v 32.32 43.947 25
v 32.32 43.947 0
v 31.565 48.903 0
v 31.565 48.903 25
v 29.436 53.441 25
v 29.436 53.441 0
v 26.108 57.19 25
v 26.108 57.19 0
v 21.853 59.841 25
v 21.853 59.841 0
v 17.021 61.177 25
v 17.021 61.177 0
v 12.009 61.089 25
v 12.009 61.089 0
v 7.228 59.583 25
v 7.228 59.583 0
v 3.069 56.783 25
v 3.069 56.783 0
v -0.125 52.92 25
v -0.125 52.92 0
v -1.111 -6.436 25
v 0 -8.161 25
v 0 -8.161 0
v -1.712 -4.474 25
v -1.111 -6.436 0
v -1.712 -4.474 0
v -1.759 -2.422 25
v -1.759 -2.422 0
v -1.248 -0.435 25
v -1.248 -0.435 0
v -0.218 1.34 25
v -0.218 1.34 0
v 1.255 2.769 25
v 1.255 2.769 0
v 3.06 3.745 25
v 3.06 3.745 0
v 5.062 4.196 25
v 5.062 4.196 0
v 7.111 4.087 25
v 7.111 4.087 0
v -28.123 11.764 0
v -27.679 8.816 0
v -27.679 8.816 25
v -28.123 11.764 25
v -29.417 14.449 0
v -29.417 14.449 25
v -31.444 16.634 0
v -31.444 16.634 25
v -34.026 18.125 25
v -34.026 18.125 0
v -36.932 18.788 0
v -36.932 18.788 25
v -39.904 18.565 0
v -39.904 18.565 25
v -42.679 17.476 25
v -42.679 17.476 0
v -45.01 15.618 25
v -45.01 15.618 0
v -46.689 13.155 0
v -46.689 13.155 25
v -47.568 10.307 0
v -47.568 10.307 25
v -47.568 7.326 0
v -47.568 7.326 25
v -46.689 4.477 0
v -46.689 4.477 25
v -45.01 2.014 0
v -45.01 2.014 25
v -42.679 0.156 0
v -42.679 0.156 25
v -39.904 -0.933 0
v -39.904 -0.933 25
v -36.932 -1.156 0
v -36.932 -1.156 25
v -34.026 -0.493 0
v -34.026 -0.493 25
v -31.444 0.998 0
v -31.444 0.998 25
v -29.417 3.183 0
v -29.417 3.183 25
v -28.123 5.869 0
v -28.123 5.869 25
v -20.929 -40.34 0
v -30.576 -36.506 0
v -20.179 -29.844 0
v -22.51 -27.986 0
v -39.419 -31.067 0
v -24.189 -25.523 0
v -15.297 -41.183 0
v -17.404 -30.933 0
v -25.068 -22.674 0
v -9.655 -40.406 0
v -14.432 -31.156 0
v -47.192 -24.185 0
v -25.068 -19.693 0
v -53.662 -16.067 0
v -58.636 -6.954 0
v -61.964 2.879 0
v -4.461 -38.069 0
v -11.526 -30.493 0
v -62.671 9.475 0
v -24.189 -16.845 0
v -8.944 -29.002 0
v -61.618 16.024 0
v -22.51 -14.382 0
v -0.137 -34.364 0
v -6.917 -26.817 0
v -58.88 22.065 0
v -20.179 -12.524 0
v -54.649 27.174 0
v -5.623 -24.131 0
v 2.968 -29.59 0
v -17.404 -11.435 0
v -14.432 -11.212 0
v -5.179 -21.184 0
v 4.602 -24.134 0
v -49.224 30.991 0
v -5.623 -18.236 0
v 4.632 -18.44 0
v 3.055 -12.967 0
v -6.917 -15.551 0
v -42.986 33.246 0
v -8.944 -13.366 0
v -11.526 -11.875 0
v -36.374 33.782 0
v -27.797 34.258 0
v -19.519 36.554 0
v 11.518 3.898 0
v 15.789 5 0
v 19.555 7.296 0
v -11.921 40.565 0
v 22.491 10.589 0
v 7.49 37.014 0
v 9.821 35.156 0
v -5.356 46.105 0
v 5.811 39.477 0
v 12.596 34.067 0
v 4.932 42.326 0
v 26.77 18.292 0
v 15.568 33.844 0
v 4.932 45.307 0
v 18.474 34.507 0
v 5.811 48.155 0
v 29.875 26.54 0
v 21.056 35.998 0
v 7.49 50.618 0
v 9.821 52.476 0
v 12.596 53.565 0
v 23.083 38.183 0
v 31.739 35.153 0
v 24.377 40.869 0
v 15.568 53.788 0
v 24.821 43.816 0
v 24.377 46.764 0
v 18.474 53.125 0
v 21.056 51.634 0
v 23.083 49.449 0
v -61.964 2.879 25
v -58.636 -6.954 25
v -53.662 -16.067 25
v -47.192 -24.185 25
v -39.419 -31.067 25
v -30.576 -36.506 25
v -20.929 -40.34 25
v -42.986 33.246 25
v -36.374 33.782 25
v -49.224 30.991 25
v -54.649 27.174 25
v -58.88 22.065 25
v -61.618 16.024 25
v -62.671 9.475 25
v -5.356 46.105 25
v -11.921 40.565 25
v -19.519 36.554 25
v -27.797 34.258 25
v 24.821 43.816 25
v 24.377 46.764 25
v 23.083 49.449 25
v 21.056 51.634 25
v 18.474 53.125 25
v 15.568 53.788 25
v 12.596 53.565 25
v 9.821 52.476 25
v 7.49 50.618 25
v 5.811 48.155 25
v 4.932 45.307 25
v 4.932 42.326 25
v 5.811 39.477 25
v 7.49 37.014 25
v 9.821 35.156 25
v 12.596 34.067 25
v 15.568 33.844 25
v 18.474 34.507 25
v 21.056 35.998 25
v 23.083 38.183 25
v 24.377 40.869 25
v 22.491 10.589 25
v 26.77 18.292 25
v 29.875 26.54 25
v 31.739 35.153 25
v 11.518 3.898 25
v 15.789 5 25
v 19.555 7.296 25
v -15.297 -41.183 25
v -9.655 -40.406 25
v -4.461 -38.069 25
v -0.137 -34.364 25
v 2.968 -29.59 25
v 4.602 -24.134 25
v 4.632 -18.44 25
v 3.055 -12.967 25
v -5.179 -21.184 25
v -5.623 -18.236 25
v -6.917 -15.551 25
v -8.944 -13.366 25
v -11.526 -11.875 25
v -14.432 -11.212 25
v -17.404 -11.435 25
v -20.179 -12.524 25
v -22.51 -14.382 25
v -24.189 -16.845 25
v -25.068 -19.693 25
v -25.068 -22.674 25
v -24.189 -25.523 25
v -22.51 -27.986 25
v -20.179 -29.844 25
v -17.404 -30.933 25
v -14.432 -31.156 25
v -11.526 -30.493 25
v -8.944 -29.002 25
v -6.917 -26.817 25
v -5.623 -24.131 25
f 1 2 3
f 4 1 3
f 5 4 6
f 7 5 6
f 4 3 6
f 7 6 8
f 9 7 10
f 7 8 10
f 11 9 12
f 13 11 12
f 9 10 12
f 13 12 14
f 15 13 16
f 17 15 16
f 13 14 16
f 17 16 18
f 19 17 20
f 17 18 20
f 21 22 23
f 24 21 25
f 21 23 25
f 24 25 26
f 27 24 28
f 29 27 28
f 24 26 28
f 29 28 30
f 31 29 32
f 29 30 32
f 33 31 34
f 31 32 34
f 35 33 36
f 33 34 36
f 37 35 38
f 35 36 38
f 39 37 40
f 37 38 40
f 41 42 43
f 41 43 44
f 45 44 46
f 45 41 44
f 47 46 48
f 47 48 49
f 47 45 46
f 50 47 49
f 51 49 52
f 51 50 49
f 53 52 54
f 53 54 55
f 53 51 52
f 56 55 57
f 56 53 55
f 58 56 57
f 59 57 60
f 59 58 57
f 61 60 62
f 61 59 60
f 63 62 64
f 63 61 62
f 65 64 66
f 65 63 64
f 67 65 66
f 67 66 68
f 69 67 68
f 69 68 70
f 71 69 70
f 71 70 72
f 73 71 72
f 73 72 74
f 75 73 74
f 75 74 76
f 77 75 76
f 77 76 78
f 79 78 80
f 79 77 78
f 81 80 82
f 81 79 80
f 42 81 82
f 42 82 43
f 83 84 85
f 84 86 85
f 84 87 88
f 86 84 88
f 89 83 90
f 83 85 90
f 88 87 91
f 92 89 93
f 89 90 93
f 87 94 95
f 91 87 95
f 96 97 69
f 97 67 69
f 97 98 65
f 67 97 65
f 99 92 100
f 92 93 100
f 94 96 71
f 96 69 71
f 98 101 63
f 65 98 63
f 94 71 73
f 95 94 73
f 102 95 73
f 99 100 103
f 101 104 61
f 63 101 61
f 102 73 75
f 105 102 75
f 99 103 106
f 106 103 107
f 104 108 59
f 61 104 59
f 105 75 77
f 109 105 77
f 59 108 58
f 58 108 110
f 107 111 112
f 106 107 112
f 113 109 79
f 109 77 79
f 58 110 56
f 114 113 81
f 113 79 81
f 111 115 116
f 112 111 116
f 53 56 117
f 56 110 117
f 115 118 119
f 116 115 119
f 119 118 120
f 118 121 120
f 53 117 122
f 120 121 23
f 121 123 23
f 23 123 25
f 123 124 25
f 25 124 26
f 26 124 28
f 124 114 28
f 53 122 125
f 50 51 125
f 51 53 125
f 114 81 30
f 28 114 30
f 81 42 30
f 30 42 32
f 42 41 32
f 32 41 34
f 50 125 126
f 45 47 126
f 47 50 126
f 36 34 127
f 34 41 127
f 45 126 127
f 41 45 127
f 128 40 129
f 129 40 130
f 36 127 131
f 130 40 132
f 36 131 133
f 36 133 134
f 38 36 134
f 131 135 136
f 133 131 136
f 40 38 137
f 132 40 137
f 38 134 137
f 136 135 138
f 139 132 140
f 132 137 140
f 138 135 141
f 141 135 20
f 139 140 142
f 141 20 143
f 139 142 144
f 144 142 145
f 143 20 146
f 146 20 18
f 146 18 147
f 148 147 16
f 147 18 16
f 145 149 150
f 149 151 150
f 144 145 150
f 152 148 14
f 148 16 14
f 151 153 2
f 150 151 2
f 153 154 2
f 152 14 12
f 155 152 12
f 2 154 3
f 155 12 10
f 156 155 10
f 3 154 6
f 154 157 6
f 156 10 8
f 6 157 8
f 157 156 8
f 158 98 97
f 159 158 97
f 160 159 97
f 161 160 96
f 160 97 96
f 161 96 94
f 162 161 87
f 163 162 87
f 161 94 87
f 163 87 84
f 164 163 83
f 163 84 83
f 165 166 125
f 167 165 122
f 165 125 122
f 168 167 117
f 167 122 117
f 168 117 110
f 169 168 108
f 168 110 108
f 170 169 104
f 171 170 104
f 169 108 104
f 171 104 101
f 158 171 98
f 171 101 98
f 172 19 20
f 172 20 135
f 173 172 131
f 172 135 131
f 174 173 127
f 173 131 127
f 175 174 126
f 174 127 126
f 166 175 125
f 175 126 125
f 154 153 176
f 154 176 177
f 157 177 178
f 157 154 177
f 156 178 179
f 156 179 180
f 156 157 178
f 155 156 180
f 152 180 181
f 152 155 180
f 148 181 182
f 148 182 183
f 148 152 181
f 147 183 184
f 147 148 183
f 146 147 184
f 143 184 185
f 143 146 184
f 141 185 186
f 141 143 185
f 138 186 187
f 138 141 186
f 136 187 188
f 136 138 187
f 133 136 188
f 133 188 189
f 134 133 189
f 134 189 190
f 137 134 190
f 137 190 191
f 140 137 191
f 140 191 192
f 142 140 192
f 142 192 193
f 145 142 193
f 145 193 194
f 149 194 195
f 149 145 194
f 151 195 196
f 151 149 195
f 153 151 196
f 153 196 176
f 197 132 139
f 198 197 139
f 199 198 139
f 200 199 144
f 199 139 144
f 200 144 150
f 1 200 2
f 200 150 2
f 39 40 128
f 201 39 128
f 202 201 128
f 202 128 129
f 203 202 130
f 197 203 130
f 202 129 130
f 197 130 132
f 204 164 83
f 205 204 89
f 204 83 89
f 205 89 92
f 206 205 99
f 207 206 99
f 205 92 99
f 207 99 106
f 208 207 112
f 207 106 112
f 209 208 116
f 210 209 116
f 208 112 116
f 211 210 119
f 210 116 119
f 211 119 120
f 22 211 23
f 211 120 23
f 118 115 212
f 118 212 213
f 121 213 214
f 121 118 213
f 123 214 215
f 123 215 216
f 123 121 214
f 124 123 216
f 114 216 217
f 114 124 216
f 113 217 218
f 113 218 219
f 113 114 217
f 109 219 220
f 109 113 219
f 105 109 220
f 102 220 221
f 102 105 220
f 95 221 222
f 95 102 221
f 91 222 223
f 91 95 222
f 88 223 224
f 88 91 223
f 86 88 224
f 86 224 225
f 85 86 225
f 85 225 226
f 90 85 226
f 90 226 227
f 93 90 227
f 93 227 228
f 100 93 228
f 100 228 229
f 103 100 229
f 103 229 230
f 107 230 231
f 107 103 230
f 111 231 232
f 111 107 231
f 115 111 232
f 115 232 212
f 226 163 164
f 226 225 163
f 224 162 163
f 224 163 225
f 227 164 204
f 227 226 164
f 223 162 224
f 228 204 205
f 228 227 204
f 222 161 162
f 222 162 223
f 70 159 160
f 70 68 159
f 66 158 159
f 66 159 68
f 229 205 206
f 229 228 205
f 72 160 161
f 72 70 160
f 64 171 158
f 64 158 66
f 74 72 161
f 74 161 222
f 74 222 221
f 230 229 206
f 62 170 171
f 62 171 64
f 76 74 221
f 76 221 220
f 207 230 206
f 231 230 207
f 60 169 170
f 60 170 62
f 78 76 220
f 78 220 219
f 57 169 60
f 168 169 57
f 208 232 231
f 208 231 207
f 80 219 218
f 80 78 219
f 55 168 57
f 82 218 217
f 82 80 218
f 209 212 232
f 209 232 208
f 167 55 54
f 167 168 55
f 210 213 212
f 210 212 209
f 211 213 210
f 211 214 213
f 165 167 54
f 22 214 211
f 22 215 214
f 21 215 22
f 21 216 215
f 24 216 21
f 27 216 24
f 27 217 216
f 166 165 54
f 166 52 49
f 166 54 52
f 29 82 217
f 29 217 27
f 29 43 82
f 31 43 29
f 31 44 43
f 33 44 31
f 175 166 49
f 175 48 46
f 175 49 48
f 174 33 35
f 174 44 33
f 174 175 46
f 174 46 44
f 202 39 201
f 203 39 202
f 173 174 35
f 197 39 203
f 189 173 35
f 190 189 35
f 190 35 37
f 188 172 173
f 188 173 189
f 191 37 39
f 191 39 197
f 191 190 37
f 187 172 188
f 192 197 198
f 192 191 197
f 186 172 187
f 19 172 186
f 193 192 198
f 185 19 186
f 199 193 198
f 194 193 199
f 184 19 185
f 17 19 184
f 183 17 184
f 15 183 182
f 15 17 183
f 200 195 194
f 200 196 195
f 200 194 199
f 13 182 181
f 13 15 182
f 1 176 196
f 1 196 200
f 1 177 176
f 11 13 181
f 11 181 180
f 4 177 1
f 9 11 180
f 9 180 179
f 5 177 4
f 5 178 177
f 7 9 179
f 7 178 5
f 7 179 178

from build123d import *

# Parameters (mm, degrees)
F0_R     = 10
F1_DEPTH = 25


with BuildPart() as f1:
    # F0 (on Top) → F1 (new body)
    with BuildSketch(Plane.XY):
        with BuildLine():
            ThreePointArc((-0.125005, 52.919645), (-15.611975, 38.354571), (-36.374445, 33.7821))
            ThreePointArc((-36.374445, 33.7821), (-56.934508, 24.760874), (-61.964058, 2.879321))
            ThreePointArc((-61.964058, 2.879321), (-47.191722, -24.185276), (-20.928604, -40.339624))
            ThreePointArc((-20.928604, -40.339624), (1.586671, -32.088196), (0, -8.161096))
            ThreePointArc((0, -8.161096), (-0.793901, 0.488122), (7.110988, 4.087009))
            ThreePointArc((7.110988, 4.087009), (15.789149, 4.999968), (22.49075, 10.588574))
            ThreePointArc((22.49075, 10.588574), (29.875343, 26.539907), (32.320302, 43.946786))
            ThreePointArc((32.320302, 43.946786), (19.485381, 60.683049), (-0.125005, 52.919645))
        make_face()
        with Locations((-15.179211, -21.183829)):
            Circle(F0_R, mode=Mode.SUBTRACT)
        with Locations((-37.679211, 8.816171)):
            Circle(F0_R, mode=Mode.SUBTRACT)
        with Locations((14.820789, 43.816171)):
            Circle(F0_R, mode=Mode.SUBTRACT)
    extrude(amount=F1_DEPTH)


solid = f1.part
